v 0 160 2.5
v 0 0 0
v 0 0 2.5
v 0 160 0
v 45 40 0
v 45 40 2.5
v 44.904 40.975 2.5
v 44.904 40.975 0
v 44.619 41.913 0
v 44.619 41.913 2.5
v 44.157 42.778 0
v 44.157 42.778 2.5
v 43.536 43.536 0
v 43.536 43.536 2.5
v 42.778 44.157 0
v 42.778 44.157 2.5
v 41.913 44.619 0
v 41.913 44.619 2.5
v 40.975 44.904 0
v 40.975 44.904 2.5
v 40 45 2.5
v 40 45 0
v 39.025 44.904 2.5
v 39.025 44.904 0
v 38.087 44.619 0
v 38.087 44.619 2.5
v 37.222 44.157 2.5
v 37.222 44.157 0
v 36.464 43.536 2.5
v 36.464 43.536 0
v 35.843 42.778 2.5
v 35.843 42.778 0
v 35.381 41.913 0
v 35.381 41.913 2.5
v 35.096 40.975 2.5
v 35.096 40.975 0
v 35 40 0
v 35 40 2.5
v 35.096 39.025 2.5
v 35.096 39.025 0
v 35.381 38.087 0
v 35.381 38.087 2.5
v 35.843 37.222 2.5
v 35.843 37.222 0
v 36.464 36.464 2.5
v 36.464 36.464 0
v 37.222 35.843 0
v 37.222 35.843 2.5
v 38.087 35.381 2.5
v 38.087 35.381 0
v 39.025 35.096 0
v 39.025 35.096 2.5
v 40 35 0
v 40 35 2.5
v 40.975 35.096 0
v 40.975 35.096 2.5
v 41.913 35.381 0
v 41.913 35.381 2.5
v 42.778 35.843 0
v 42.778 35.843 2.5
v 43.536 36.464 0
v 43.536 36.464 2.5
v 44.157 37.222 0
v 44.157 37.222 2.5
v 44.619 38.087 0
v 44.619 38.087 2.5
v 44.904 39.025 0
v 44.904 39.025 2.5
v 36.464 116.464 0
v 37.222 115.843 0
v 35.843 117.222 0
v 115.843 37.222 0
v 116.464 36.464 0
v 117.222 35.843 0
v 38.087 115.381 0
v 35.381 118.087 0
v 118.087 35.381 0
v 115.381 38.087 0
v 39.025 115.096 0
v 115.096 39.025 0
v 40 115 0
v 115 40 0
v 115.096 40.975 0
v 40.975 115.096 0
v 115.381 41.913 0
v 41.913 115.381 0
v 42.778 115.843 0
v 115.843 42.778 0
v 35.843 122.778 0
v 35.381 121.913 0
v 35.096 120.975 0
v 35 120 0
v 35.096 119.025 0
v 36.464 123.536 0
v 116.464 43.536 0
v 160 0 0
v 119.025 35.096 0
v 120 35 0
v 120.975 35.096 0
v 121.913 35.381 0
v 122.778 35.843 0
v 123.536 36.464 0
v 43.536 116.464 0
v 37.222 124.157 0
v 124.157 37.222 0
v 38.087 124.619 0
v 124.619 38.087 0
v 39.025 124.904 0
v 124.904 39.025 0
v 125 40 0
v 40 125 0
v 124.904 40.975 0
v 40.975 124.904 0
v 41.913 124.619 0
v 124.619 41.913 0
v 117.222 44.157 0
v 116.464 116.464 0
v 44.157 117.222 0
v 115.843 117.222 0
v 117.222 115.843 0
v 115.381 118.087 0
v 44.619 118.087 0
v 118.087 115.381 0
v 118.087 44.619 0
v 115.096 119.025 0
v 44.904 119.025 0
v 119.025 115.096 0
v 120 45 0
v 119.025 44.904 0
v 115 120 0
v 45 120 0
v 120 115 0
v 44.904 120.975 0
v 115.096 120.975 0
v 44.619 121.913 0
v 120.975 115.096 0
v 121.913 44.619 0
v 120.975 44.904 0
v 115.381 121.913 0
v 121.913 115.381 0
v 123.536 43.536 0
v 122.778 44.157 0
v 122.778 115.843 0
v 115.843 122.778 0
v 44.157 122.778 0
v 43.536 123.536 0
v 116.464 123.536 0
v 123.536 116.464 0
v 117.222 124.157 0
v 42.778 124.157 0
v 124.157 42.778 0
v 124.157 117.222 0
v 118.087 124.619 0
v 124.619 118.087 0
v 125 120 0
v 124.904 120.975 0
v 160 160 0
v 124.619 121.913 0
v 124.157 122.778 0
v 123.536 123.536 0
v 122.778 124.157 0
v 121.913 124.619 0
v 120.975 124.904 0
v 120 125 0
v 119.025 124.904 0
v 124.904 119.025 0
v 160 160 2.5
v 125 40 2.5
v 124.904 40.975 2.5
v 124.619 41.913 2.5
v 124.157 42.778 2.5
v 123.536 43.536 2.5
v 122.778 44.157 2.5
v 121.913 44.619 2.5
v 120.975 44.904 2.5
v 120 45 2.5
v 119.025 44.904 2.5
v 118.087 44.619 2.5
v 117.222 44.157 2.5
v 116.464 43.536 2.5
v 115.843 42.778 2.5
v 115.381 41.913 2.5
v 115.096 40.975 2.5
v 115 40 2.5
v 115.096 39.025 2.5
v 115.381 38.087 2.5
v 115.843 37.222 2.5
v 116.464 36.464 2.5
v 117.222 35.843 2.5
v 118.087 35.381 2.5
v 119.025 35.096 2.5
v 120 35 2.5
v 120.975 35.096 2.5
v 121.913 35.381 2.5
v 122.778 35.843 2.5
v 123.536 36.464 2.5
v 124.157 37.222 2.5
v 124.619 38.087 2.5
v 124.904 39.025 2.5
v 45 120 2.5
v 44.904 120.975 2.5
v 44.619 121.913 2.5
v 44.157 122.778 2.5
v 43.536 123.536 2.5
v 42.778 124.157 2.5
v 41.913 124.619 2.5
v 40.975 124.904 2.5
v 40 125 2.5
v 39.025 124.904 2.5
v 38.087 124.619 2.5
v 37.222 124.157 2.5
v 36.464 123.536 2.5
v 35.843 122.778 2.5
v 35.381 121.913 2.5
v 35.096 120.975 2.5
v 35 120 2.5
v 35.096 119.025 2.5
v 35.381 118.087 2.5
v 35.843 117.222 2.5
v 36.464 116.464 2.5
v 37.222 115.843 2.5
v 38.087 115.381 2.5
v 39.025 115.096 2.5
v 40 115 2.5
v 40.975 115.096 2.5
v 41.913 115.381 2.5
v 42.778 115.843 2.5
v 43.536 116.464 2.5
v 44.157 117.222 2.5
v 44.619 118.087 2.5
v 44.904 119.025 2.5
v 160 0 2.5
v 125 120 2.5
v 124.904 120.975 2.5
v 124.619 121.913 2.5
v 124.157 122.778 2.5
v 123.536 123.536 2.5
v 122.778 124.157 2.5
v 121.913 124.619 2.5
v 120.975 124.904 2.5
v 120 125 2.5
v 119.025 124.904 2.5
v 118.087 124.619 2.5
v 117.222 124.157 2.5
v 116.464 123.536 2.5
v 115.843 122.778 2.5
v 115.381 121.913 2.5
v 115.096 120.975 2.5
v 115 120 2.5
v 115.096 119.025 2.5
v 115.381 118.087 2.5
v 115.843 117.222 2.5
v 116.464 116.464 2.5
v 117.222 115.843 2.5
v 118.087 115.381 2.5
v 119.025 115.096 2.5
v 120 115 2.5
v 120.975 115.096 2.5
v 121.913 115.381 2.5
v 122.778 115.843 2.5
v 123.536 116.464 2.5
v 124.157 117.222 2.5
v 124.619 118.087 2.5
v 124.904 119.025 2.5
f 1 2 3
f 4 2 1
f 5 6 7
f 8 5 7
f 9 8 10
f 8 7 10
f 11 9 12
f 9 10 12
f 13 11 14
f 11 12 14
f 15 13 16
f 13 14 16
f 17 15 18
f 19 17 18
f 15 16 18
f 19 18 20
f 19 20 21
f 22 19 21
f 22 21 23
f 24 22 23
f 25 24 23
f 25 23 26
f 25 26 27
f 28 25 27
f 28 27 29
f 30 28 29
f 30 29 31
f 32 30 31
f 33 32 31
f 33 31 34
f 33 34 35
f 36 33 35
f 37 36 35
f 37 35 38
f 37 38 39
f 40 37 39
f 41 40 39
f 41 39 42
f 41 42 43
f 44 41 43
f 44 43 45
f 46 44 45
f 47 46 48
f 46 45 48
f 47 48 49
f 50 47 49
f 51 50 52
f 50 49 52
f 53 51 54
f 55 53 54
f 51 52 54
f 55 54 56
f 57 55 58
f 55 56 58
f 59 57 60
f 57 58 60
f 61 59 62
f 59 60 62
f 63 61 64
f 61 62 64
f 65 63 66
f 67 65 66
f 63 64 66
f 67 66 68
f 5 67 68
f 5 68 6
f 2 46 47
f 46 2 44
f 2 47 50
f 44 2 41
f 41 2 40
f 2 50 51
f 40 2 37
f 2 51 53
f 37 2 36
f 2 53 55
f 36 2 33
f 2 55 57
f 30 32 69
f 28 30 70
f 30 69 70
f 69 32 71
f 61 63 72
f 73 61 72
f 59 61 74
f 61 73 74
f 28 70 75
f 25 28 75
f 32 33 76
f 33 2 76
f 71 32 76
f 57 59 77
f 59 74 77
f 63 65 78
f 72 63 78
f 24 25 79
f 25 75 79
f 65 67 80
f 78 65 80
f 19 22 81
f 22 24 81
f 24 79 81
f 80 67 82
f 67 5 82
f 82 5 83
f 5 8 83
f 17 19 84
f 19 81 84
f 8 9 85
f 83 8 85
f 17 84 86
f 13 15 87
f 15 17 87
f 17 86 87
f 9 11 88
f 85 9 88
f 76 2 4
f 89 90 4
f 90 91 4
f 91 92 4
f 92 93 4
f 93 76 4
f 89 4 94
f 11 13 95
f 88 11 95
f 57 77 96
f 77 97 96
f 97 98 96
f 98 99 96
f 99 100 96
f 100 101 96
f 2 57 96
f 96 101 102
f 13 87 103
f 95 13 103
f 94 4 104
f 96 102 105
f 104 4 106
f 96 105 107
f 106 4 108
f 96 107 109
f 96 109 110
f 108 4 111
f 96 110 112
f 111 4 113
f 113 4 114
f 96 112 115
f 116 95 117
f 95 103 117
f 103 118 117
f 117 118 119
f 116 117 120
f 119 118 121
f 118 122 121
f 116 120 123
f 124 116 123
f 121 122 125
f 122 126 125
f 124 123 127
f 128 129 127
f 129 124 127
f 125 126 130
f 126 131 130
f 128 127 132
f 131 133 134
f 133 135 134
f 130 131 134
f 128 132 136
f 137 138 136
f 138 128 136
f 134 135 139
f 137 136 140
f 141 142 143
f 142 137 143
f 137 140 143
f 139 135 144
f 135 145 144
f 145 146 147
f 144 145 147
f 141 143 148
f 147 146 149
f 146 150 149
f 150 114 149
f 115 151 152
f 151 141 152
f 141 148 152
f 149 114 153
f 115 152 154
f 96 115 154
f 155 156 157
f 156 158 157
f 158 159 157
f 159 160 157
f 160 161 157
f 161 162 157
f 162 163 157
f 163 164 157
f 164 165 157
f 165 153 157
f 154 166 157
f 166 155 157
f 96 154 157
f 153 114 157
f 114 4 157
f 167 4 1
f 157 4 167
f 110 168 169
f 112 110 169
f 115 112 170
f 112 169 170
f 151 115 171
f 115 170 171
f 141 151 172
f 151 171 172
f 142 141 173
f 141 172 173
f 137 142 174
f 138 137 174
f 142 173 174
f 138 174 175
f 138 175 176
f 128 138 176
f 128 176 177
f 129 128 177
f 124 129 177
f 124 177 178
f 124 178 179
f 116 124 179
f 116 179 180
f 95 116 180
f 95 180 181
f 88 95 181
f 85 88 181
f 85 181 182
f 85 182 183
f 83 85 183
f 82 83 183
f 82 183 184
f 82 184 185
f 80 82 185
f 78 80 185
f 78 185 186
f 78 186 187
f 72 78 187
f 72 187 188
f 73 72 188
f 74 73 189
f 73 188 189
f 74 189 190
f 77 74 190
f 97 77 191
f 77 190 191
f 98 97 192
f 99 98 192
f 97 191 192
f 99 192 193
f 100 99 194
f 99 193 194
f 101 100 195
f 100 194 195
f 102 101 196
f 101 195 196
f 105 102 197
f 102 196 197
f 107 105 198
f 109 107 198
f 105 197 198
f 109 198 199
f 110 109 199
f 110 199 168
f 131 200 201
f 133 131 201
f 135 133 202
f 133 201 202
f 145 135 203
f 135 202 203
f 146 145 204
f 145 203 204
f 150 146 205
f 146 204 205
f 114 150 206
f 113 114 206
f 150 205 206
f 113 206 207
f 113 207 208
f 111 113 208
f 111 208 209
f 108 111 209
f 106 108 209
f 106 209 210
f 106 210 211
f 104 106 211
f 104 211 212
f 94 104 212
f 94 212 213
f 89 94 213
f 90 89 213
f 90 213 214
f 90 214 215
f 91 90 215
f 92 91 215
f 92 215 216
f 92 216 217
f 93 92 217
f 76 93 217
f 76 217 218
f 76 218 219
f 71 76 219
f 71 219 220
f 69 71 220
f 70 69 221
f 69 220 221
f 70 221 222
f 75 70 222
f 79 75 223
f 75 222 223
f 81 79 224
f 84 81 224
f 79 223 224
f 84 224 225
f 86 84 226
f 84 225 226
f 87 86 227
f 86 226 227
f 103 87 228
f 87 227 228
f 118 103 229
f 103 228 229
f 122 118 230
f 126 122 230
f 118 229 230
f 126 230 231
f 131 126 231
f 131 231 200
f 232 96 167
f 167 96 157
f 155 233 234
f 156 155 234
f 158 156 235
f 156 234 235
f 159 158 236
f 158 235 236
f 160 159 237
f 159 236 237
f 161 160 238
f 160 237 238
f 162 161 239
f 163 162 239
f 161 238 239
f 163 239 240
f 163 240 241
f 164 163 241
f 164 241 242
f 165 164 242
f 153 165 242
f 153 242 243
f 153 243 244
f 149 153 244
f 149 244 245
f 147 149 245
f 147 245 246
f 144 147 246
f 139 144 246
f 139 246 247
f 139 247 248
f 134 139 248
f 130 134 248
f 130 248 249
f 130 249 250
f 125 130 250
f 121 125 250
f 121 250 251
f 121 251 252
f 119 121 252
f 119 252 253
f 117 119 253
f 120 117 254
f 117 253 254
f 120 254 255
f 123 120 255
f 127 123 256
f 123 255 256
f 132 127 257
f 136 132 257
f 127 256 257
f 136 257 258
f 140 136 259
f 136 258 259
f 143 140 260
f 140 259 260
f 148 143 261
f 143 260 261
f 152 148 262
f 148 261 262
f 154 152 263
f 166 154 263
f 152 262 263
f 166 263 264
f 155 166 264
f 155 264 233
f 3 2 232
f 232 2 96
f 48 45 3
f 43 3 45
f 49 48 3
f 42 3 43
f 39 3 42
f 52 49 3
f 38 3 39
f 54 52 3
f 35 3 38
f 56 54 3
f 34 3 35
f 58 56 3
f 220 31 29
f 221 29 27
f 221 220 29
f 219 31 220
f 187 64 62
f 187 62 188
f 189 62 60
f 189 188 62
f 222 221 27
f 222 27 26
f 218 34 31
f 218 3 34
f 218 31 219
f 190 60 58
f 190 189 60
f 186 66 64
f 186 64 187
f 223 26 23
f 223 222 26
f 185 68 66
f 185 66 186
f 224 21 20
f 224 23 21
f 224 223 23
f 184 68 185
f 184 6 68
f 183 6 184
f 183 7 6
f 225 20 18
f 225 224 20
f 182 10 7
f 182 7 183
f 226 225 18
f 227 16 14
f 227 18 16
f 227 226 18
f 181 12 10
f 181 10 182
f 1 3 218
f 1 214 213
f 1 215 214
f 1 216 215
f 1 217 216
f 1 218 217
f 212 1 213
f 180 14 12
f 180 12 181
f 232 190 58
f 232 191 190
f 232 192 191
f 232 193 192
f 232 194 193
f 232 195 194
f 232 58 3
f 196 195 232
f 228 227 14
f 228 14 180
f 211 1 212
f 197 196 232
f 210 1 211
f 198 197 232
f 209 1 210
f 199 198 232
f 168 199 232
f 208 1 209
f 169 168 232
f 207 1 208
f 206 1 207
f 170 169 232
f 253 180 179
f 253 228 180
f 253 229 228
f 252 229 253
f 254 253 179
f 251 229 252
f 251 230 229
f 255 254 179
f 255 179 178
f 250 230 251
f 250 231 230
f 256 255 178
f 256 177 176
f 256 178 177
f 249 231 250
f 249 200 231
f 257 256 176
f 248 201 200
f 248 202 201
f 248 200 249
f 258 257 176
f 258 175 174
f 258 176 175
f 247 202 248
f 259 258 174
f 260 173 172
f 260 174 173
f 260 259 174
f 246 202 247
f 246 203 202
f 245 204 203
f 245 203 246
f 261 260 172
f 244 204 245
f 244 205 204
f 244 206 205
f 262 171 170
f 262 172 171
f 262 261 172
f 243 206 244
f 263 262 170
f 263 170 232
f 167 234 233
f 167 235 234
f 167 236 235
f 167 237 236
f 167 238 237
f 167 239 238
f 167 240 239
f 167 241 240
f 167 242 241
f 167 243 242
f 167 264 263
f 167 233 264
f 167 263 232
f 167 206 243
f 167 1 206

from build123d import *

# Parameters (mm, degrees)
SKETCH_1_W                  = 160
SKETCH_1_H                  = 160
EXTRUDE_1_DEPTH             = 2.5
SKETCH_2_R                  = 5
CUT_EXTRUDE_1_DEPTH         = 227.287980238
PATTERN_LINEAR_1_COUNT      = 2
PATTERN_LINEAR_1_PITCH      = 80
PATTERN_LINEAR_1_COUNT_DIR2 = 2
PATTERN_LINEAR_1_PITCH_DIR2 = 80


with BuildPart() as part:
    # 草图1 → 凸台-拉伸1 (new body)
    with BuildSketch(Plane.XY):
        with Locations((80, 80)):
            Rectangle(SKETCH_1_W, SKETCH_1_H)
    extrude(amount=EXTRUDE_1_DEPTH)

    # 草图2 → 切除-拉伸1 (cut, through all)
    with BuildSketch(Plane.XY.offset(2.5)):
        with Locations((40, 120)):
            Circle(SKETCH_2_R)
    cut_extrude_1 = extrude(amount=-CUT_EXTRUDE_1_DEPTH, mode=Mode.SUBTRACT)

    # 阵列(线性)1: Cut-Extrude 1 2 × 2
    with Locations(*[(i * PATTERN_LINEAR_1_PITCH, -j * PATTERN_LINEAR_1_PITCH_DIR2, 0) for i in range(PATTERN_LINEAR_1_COUNT) for j in range(PATTERN_LINEAR_1_COUNT_DIR2) if (i, j) != (0, 0)]):
        add(cut_extrude_1, mode=Mode.SUBTRACT)


solid = part.part
